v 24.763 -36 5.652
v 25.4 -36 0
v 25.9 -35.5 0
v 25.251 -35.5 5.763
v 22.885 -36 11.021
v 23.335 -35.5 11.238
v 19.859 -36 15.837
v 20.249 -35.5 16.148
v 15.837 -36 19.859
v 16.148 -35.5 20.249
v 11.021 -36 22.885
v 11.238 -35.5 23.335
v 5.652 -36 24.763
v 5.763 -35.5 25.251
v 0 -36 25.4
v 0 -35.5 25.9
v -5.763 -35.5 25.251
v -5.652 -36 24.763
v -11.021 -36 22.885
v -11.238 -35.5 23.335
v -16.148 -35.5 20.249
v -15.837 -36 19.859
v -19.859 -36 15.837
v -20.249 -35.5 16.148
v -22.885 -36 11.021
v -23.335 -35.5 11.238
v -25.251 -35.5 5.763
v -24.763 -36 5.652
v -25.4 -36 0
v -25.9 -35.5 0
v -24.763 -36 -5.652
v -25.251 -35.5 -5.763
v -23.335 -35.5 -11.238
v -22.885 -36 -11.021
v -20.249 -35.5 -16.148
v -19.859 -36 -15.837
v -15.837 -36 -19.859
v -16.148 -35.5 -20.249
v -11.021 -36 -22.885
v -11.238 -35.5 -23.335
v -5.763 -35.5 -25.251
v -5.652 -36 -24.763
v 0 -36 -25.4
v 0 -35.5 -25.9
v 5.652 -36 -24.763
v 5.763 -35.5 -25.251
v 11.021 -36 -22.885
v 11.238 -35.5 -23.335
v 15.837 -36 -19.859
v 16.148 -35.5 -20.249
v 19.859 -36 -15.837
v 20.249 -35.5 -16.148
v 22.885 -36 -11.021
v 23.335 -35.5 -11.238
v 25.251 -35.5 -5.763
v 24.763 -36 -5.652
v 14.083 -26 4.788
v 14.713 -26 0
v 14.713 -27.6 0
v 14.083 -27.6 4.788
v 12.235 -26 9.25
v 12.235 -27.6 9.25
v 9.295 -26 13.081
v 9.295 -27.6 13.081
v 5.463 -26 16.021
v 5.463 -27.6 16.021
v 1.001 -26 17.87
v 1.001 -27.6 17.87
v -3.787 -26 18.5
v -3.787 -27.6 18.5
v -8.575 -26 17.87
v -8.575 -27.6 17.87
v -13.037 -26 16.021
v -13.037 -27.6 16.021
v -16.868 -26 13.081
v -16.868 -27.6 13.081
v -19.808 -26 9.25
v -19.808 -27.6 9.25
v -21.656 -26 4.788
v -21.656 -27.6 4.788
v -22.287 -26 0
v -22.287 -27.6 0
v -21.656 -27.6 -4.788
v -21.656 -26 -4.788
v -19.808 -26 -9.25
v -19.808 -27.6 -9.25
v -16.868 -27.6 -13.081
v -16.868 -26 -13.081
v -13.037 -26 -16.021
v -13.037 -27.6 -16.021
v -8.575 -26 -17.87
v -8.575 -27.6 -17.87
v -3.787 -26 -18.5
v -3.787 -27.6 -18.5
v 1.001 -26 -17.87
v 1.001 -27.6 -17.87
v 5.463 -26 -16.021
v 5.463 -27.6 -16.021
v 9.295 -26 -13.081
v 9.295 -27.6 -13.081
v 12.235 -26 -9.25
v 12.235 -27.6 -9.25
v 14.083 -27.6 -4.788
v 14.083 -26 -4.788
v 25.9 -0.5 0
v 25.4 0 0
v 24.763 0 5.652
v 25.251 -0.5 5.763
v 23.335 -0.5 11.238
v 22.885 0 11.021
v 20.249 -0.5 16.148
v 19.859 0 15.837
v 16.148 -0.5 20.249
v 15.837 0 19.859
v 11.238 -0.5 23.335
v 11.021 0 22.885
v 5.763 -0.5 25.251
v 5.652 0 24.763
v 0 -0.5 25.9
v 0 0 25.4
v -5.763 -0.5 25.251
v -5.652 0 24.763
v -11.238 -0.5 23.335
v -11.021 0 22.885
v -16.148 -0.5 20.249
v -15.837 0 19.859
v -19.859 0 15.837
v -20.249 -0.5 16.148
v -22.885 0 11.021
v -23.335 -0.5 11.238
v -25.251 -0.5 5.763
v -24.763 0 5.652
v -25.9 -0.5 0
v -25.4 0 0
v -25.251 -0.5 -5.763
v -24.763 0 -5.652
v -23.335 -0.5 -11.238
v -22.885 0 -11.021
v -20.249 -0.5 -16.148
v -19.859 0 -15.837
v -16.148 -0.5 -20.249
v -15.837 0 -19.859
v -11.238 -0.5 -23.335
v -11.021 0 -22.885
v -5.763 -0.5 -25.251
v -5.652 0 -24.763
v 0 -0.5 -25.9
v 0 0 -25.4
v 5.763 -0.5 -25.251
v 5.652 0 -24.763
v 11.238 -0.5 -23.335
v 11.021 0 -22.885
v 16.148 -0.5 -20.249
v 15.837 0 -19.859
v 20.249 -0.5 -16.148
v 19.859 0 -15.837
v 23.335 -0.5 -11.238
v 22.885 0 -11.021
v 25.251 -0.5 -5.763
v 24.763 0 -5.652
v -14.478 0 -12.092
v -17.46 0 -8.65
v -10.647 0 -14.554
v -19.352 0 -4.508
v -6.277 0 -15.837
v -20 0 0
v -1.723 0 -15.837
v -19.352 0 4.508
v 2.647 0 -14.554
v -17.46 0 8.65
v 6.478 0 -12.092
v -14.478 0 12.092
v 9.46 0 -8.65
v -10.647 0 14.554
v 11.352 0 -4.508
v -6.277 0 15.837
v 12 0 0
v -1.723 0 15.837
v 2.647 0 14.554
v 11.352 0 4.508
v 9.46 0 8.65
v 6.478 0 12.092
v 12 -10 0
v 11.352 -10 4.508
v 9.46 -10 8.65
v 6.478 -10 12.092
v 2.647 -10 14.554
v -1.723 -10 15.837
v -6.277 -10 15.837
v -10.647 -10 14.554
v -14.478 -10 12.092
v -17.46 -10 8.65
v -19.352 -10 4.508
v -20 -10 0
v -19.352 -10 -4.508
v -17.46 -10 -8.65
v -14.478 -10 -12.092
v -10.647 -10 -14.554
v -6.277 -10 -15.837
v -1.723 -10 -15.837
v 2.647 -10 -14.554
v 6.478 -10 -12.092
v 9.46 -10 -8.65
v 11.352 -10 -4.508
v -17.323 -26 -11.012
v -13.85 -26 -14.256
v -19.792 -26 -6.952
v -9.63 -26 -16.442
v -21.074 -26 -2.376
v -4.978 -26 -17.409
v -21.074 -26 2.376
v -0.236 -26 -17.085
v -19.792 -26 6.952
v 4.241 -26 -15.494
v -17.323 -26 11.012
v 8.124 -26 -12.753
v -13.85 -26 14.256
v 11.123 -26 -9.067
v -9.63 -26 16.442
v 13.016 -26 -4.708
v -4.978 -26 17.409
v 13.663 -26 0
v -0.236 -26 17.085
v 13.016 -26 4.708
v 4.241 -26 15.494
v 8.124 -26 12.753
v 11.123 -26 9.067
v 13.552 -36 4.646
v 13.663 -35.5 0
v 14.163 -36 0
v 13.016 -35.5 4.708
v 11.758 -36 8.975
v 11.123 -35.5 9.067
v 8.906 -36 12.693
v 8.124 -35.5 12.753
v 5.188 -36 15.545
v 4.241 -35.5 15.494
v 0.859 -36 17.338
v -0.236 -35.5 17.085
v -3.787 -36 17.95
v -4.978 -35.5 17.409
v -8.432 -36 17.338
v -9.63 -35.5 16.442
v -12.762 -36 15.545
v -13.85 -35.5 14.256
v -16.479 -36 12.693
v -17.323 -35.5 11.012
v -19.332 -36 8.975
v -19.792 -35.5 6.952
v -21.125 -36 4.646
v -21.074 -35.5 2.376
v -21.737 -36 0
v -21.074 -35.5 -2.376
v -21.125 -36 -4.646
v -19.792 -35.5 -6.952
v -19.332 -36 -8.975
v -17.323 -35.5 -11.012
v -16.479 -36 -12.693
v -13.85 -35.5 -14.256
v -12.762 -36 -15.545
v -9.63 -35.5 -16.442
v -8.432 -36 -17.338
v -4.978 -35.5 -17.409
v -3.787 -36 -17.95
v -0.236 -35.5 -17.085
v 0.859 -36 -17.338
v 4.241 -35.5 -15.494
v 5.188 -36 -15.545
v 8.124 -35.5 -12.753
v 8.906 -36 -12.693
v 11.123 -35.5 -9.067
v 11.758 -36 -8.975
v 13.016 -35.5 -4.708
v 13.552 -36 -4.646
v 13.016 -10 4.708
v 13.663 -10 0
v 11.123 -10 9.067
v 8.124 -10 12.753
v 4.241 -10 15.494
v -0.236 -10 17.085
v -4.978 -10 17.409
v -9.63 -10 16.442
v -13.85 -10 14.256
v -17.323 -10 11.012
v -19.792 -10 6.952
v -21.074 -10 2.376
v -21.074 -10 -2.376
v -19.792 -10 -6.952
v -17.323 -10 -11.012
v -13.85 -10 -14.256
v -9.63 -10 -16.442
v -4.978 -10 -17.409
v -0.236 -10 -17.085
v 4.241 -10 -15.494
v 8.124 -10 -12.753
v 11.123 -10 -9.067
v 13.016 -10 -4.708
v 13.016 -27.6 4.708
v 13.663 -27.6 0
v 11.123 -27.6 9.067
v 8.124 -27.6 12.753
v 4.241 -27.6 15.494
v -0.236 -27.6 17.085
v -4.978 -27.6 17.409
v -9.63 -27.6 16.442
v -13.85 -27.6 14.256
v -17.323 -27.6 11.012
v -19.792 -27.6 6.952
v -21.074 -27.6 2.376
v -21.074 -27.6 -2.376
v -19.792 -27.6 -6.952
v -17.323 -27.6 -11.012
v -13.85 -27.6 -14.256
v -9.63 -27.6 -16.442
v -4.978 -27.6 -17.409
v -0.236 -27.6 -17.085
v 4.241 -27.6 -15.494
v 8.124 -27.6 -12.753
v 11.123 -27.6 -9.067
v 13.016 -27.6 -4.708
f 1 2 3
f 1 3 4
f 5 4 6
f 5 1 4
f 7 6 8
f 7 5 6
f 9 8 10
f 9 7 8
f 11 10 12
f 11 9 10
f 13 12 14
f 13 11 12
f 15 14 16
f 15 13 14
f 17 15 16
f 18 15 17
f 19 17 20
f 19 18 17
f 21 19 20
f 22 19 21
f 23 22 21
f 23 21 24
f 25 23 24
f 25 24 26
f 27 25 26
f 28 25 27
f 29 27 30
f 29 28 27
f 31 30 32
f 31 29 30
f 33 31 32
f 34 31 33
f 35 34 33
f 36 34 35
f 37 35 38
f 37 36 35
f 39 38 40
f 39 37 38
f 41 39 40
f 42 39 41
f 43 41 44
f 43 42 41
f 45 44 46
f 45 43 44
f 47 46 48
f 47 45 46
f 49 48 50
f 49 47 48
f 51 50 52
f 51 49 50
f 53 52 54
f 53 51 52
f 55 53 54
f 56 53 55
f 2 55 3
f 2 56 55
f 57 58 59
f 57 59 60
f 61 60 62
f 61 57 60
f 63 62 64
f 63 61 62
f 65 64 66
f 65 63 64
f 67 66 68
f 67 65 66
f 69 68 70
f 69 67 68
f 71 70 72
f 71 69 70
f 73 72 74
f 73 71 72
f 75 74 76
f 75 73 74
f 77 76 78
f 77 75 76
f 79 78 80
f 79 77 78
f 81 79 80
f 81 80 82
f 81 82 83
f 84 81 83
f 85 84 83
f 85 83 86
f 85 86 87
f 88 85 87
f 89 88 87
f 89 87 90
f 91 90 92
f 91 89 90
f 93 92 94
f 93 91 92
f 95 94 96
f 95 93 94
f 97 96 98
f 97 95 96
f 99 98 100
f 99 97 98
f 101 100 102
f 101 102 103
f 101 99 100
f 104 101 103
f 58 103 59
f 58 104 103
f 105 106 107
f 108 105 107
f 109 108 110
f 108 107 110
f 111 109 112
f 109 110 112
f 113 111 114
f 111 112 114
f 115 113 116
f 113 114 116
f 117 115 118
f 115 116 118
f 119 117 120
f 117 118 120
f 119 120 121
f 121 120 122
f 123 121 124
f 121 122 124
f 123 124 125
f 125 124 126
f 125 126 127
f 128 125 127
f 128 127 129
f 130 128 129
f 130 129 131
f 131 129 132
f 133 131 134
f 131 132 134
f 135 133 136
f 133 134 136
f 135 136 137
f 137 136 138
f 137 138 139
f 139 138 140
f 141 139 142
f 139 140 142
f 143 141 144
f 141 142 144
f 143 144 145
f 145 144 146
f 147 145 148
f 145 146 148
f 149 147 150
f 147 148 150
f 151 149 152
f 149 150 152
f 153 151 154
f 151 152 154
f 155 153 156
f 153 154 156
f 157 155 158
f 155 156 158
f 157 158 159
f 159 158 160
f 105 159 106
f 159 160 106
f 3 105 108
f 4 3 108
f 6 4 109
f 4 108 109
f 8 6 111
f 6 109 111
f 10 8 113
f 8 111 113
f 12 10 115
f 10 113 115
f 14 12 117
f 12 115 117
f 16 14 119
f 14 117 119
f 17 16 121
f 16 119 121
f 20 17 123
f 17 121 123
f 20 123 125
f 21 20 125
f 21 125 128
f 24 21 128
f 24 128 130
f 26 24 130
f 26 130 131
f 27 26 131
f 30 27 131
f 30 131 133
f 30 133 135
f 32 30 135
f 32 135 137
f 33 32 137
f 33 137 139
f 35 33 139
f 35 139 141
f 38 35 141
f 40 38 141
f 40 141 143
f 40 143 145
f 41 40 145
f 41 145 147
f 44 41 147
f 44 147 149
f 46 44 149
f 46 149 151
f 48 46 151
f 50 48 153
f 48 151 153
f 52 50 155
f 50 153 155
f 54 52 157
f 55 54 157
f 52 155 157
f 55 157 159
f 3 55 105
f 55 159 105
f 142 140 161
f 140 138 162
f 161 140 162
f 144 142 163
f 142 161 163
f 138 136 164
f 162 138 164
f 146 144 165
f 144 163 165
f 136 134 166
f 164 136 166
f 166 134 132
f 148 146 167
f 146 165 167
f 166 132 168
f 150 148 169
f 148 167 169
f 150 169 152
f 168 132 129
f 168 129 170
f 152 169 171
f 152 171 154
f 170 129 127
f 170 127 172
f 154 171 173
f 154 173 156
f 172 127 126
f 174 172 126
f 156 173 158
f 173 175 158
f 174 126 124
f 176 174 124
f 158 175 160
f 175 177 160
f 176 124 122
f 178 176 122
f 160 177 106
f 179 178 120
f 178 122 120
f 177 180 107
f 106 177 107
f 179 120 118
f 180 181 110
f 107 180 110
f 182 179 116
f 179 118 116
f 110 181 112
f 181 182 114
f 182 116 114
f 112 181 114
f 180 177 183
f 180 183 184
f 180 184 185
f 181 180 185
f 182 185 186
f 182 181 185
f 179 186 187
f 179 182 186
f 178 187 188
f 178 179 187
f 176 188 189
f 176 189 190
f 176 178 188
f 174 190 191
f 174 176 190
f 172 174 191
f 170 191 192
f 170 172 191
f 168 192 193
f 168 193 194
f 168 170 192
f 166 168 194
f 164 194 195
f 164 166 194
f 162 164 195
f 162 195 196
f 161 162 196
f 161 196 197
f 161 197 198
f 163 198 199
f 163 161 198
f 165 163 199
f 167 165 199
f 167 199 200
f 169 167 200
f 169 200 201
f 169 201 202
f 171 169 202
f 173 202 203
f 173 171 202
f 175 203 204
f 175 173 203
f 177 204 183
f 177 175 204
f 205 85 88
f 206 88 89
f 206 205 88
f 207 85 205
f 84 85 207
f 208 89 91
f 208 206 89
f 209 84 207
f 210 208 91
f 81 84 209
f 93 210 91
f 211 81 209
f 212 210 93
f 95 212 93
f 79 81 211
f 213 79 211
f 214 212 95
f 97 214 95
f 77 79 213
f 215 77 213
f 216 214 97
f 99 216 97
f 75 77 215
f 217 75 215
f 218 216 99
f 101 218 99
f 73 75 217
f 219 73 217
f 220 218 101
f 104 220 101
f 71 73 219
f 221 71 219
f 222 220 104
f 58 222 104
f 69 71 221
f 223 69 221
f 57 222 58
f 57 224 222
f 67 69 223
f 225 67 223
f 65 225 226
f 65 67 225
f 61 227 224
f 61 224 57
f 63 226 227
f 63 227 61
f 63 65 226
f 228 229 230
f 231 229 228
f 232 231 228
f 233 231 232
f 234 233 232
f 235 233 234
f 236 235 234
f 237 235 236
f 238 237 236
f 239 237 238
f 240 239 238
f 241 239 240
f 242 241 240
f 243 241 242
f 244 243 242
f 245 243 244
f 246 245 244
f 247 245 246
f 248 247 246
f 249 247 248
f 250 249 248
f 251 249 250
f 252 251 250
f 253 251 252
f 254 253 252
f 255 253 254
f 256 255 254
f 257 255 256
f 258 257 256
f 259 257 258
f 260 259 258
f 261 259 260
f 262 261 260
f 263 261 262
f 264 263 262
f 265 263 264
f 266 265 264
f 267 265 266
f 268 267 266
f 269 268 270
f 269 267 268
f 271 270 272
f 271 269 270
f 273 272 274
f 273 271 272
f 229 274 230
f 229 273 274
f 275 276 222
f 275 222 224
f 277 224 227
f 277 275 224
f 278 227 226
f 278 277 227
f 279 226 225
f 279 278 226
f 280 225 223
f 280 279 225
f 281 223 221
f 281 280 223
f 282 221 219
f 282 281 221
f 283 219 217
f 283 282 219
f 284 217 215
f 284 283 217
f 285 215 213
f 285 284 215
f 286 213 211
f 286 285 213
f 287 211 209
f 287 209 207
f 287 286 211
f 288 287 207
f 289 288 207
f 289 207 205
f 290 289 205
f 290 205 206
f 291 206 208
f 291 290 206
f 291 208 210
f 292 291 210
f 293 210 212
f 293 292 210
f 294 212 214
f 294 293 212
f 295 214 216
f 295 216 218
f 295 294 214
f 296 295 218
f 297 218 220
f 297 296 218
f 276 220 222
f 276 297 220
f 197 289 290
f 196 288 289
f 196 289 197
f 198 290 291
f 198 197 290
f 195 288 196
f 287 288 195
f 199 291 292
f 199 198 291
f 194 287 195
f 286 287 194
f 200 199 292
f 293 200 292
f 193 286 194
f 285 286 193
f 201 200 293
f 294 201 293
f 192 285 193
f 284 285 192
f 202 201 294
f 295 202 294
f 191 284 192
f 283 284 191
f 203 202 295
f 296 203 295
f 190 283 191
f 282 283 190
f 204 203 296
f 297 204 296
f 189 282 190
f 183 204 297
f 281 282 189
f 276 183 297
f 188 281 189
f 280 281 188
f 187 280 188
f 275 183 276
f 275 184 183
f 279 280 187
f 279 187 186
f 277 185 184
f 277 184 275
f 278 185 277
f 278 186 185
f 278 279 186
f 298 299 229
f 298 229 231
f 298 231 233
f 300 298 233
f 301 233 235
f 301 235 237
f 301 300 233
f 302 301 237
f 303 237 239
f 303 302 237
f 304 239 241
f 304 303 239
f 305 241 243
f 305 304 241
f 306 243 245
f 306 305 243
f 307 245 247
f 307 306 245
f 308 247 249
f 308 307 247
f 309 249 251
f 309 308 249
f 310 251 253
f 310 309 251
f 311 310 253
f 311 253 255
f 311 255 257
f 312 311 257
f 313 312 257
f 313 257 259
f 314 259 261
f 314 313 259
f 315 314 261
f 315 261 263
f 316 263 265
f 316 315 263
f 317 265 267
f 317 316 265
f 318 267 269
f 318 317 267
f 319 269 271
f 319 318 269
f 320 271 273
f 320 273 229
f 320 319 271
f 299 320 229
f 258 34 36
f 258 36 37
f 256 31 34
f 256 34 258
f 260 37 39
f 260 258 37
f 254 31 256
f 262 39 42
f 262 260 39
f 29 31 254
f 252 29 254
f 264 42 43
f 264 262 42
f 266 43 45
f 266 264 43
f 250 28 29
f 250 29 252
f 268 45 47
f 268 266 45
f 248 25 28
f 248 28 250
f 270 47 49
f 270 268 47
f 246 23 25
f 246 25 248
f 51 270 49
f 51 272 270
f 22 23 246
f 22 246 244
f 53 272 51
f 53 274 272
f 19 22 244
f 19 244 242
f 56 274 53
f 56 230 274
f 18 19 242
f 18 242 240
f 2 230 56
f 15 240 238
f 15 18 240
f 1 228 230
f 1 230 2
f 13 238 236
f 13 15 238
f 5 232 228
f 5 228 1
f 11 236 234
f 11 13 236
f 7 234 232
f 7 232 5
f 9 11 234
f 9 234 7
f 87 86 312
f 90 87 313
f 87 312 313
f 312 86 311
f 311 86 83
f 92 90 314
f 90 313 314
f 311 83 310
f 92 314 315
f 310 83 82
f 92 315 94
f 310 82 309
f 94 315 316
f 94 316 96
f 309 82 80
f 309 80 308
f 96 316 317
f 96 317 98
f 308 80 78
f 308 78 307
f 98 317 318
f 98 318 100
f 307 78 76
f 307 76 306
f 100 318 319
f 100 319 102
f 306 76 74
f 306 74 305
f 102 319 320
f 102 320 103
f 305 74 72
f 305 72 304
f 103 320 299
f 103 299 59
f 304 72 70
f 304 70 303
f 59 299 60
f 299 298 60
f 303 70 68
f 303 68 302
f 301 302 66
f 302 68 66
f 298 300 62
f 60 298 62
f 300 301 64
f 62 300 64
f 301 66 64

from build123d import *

# Parameters (mm, degrees)
F0_R     = 25.9
F0_R_2   = 16
F1_DEPTH = 10
F3_R     = 25.9
F3_R_2   = 17.45
F4_DEPTH = 16
F5_R     = 25.9
F5_R_2   = 18.5
F6_DEPTH = 1.6
F7_R     = 25.9
F7_R_2   = 18.5
F7_R_3   = 17.45
F8_DEPTH = 8.4
F9_SIZE  = 0.5
F10_SIZE = 0.5
F11_SIZE = 0.5


# Not quite as in the source:
# - a feature names something its author has since deleted; it is built from what else it names


with BuildPart() as f1:
    # F0 (on Front) → F1 (new body)
    with BuildSketch(Plane.XZ):
        Circle(F0_R)
        with Locations((-4, 0)):
            Circle(F0_R_2, mode=Mode.SUBTRACT)
    extrude(amount=F1_DEPTH)

    # F3 (on face) → F4 (join)
    with BuildSketch(Plane.XZ.offset(10)):
        Circle(F3_R)
        with Locations((-3.7866821816, 0)):
            Circle(F3_R_2, mode=Mode.SUBTRACT)
    extrude(amount=F4_DEPTH)

    # F5 (on face) → F6 (join)
    with BuildSketch(Plane.XZ.offset(26)):
        Circle(F5_R)
        with Locations((-3.7866821816, 0)):
            Circle(F5_R_2, mode=Mode.SUBTRACT)
    extrude(amount=F6_DEPTH)

    # F7 (on face) → F8 (join)
    with BuildSketch(Plane.XZ.offset(27.6)):
        Circle(F7_R)
        with Locations((-3.7866821816, 0)):
            Circle(F7_R_2, mode=Mode.SUBTRACT)
        with Locations((-3.7866821816, 0)):
            Circle(F7_R_2)
        with Locations((-3.7866821816, 0)):
            Circle(F7_R_3, mode=Mode.SUBTRACT)
    extrude(amount=F8_DEPTH)

    # F9
    f9_edges = [f1.edges().sort_by_distance(p)[0] for p in [
        (-25.9, 0, 0),
    ]]
    chamfer(f9_edges, length=F9_SIZE)

    # F10
    f10_edges = [f1.edges().sort_by_distance(p)[0] for p in [
        (-25.9, -36, 0),
    ]]
    chamfer(f10_edges, length=F10_SIZE)

    # F11
    f11_edges = [f1.edges().sort_by_distance(p)[0] for p in [
        (-21.236682, -36, 0),
    ]]
    chamfer(f11_edges, length=F11_SIZE)


solid = f1.part
